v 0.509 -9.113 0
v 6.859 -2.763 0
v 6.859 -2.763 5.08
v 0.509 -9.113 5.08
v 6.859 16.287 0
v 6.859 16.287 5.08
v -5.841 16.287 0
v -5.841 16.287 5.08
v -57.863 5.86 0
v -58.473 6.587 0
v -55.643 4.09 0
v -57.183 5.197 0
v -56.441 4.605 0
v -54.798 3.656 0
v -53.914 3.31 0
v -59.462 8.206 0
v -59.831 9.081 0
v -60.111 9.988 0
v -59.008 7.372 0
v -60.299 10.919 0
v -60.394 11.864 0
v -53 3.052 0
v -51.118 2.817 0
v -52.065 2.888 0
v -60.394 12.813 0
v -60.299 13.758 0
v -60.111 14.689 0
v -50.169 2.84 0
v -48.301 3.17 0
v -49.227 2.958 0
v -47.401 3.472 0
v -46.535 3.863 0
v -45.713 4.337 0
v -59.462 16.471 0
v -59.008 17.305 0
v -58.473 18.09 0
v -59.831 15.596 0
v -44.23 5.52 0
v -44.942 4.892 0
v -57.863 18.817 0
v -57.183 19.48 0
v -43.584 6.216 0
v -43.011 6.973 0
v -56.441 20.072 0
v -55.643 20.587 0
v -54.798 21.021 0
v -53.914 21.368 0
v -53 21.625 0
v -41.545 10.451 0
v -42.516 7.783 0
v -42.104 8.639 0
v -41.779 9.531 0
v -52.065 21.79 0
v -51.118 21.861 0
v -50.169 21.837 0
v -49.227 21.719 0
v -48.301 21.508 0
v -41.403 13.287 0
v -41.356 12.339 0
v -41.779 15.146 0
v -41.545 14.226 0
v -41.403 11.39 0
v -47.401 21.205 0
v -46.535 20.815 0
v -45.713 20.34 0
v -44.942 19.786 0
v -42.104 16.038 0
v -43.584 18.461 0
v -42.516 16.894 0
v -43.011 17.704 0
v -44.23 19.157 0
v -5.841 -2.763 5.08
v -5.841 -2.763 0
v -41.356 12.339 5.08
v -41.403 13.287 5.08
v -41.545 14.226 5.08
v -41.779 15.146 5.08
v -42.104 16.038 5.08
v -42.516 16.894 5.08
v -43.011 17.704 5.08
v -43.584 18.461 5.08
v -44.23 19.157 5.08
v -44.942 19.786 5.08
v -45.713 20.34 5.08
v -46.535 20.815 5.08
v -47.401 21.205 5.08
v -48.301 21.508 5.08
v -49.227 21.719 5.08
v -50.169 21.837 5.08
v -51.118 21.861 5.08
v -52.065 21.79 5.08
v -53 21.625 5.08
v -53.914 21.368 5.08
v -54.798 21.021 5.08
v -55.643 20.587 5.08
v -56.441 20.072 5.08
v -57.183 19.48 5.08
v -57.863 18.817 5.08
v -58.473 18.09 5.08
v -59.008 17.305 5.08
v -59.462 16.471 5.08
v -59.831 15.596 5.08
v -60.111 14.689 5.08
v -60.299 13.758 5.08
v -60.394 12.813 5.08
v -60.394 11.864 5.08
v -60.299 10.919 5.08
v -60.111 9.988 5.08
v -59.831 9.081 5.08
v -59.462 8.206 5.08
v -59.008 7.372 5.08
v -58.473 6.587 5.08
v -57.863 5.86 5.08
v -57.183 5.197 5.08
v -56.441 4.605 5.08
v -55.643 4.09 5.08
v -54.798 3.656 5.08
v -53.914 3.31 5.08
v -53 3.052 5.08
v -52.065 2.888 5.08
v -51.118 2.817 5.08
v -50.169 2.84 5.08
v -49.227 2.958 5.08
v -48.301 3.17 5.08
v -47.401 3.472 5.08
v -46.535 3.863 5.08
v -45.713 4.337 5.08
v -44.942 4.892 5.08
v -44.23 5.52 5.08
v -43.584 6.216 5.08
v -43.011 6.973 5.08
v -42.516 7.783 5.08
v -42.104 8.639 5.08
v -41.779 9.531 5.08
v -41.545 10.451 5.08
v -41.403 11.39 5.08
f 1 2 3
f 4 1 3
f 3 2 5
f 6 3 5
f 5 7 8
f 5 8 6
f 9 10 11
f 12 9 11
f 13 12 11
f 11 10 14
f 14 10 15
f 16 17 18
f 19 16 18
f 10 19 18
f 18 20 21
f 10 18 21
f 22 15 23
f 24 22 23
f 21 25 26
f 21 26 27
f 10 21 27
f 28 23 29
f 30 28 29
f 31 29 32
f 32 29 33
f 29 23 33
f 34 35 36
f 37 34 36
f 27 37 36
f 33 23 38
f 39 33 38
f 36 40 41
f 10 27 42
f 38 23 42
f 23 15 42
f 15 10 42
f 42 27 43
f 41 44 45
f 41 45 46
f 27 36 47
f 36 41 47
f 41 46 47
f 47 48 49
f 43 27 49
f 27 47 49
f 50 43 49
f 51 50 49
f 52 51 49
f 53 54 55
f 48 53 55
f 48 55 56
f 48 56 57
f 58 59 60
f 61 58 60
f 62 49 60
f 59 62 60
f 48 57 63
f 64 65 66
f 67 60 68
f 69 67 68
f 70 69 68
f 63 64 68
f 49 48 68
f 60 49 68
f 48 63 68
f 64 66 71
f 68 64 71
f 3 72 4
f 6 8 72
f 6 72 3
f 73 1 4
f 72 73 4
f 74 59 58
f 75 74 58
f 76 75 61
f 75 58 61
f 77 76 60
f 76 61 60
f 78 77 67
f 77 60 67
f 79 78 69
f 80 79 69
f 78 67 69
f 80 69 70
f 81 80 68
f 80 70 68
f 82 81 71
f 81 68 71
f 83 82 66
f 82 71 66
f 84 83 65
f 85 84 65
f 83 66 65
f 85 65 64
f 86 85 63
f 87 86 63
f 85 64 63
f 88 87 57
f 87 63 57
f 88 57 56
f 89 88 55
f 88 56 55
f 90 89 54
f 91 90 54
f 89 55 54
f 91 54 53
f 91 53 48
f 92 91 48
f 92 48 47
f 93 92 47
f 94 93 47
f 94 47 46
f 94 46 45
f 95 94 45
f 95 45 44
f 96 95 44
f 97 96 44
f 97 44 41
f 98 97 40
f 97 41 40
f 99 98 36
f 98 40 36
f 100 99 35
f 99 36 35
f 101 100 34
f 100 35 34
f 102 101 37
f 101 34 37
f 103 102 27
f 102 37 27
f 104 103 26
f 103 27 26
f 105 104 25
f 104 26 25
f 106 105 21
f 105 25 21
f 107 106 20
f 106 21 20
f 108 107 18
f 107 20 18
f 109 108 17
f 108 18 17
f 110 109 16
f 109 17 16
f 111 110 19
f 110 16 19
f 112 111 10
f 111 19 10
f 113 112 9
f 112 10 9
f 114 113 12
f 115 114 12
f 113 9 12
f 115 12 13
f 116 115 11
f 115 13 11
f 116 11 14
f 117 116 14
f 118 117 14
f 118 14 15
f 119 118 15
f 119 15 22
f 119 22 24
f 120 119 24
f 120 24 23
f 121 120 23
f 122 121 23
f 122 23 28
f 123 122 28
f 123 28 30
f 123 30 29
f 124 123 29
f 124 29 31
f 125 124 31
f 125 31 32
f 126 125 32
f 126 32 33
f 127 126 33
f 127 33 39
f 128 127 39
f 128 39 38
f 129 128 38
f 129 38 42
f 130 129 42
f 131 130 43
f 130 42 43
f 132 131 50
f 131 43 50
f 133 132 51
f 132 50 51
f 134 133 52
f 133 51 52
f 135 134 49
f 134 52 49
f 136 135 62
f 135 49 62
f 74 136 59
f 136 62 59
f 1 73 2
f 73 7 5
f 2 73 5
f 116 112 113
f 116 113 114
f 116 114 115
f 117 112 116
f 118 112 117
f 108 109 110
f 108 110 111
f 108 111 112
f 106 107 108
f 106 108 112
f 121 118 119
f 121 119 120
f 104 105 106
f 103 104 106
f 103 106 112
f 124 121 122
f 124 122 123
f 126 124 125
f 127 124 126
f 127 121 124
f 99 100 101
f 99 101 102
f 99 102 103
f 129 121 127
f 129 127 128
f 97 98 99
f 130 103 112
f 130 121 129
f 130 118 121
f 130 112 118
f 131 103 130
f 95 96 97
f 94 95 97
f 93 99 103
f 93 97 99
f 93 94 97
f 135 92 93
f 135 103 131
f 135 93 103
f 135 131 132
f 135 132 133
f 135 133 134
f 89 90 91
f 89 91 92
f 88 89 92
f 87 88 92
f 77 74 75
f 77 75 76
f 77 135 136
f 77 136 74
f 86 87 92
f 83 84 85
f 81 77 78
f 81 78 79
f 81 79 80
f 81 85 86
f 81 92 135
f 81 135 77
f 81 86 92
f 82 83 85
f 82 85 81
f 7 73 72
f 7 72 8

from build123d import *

# Parameters (mm, degrees)
F0_W     = 12.7
F0_H     = 25.4
F1_DEPTH = 5.08
F2_SIZE  = 6.34999
F3_R     = 9.525
F4_DEPTH = 5.08


# Not quite as in the source:
# - a fillet or chamfer is up to 0.001 mm smaller than in the source, because OpenCascade refuses the exact size


with BuildPart() as f1:
    # F0 (on Top) → F1 (new body)
    with BuildSketch(Plane.XY):
        with Locations((0.5088095786, 3.5865946344)):
            Rectangle(F0_W, F0_H)
    extrude(amount=F1_DEPTH)

    # F2 (size 6.35 in the source; OpenCascade refuses exactly that, so slightly less here)
    f2_edges = [f1.edges().sort_by_distance(p)[0] for p in [
        (6.85881, -9.113405, 2.54),
        (-5.84119, -9.113405, 2.54),
    ]]
    chamfer(f2_edges, length=F2_SIZE)


with BuildPart() as f4:
    # F3 (on Top) → F4 (new body)
    with BuildSketch(Plane.XY):
        with Locations((-50.8807636797, 12.3385852203)):
            Circle(F3_R)
    extrude(amount=F4_DEPTH)


solid = Compound([f1.part, f4.part])
